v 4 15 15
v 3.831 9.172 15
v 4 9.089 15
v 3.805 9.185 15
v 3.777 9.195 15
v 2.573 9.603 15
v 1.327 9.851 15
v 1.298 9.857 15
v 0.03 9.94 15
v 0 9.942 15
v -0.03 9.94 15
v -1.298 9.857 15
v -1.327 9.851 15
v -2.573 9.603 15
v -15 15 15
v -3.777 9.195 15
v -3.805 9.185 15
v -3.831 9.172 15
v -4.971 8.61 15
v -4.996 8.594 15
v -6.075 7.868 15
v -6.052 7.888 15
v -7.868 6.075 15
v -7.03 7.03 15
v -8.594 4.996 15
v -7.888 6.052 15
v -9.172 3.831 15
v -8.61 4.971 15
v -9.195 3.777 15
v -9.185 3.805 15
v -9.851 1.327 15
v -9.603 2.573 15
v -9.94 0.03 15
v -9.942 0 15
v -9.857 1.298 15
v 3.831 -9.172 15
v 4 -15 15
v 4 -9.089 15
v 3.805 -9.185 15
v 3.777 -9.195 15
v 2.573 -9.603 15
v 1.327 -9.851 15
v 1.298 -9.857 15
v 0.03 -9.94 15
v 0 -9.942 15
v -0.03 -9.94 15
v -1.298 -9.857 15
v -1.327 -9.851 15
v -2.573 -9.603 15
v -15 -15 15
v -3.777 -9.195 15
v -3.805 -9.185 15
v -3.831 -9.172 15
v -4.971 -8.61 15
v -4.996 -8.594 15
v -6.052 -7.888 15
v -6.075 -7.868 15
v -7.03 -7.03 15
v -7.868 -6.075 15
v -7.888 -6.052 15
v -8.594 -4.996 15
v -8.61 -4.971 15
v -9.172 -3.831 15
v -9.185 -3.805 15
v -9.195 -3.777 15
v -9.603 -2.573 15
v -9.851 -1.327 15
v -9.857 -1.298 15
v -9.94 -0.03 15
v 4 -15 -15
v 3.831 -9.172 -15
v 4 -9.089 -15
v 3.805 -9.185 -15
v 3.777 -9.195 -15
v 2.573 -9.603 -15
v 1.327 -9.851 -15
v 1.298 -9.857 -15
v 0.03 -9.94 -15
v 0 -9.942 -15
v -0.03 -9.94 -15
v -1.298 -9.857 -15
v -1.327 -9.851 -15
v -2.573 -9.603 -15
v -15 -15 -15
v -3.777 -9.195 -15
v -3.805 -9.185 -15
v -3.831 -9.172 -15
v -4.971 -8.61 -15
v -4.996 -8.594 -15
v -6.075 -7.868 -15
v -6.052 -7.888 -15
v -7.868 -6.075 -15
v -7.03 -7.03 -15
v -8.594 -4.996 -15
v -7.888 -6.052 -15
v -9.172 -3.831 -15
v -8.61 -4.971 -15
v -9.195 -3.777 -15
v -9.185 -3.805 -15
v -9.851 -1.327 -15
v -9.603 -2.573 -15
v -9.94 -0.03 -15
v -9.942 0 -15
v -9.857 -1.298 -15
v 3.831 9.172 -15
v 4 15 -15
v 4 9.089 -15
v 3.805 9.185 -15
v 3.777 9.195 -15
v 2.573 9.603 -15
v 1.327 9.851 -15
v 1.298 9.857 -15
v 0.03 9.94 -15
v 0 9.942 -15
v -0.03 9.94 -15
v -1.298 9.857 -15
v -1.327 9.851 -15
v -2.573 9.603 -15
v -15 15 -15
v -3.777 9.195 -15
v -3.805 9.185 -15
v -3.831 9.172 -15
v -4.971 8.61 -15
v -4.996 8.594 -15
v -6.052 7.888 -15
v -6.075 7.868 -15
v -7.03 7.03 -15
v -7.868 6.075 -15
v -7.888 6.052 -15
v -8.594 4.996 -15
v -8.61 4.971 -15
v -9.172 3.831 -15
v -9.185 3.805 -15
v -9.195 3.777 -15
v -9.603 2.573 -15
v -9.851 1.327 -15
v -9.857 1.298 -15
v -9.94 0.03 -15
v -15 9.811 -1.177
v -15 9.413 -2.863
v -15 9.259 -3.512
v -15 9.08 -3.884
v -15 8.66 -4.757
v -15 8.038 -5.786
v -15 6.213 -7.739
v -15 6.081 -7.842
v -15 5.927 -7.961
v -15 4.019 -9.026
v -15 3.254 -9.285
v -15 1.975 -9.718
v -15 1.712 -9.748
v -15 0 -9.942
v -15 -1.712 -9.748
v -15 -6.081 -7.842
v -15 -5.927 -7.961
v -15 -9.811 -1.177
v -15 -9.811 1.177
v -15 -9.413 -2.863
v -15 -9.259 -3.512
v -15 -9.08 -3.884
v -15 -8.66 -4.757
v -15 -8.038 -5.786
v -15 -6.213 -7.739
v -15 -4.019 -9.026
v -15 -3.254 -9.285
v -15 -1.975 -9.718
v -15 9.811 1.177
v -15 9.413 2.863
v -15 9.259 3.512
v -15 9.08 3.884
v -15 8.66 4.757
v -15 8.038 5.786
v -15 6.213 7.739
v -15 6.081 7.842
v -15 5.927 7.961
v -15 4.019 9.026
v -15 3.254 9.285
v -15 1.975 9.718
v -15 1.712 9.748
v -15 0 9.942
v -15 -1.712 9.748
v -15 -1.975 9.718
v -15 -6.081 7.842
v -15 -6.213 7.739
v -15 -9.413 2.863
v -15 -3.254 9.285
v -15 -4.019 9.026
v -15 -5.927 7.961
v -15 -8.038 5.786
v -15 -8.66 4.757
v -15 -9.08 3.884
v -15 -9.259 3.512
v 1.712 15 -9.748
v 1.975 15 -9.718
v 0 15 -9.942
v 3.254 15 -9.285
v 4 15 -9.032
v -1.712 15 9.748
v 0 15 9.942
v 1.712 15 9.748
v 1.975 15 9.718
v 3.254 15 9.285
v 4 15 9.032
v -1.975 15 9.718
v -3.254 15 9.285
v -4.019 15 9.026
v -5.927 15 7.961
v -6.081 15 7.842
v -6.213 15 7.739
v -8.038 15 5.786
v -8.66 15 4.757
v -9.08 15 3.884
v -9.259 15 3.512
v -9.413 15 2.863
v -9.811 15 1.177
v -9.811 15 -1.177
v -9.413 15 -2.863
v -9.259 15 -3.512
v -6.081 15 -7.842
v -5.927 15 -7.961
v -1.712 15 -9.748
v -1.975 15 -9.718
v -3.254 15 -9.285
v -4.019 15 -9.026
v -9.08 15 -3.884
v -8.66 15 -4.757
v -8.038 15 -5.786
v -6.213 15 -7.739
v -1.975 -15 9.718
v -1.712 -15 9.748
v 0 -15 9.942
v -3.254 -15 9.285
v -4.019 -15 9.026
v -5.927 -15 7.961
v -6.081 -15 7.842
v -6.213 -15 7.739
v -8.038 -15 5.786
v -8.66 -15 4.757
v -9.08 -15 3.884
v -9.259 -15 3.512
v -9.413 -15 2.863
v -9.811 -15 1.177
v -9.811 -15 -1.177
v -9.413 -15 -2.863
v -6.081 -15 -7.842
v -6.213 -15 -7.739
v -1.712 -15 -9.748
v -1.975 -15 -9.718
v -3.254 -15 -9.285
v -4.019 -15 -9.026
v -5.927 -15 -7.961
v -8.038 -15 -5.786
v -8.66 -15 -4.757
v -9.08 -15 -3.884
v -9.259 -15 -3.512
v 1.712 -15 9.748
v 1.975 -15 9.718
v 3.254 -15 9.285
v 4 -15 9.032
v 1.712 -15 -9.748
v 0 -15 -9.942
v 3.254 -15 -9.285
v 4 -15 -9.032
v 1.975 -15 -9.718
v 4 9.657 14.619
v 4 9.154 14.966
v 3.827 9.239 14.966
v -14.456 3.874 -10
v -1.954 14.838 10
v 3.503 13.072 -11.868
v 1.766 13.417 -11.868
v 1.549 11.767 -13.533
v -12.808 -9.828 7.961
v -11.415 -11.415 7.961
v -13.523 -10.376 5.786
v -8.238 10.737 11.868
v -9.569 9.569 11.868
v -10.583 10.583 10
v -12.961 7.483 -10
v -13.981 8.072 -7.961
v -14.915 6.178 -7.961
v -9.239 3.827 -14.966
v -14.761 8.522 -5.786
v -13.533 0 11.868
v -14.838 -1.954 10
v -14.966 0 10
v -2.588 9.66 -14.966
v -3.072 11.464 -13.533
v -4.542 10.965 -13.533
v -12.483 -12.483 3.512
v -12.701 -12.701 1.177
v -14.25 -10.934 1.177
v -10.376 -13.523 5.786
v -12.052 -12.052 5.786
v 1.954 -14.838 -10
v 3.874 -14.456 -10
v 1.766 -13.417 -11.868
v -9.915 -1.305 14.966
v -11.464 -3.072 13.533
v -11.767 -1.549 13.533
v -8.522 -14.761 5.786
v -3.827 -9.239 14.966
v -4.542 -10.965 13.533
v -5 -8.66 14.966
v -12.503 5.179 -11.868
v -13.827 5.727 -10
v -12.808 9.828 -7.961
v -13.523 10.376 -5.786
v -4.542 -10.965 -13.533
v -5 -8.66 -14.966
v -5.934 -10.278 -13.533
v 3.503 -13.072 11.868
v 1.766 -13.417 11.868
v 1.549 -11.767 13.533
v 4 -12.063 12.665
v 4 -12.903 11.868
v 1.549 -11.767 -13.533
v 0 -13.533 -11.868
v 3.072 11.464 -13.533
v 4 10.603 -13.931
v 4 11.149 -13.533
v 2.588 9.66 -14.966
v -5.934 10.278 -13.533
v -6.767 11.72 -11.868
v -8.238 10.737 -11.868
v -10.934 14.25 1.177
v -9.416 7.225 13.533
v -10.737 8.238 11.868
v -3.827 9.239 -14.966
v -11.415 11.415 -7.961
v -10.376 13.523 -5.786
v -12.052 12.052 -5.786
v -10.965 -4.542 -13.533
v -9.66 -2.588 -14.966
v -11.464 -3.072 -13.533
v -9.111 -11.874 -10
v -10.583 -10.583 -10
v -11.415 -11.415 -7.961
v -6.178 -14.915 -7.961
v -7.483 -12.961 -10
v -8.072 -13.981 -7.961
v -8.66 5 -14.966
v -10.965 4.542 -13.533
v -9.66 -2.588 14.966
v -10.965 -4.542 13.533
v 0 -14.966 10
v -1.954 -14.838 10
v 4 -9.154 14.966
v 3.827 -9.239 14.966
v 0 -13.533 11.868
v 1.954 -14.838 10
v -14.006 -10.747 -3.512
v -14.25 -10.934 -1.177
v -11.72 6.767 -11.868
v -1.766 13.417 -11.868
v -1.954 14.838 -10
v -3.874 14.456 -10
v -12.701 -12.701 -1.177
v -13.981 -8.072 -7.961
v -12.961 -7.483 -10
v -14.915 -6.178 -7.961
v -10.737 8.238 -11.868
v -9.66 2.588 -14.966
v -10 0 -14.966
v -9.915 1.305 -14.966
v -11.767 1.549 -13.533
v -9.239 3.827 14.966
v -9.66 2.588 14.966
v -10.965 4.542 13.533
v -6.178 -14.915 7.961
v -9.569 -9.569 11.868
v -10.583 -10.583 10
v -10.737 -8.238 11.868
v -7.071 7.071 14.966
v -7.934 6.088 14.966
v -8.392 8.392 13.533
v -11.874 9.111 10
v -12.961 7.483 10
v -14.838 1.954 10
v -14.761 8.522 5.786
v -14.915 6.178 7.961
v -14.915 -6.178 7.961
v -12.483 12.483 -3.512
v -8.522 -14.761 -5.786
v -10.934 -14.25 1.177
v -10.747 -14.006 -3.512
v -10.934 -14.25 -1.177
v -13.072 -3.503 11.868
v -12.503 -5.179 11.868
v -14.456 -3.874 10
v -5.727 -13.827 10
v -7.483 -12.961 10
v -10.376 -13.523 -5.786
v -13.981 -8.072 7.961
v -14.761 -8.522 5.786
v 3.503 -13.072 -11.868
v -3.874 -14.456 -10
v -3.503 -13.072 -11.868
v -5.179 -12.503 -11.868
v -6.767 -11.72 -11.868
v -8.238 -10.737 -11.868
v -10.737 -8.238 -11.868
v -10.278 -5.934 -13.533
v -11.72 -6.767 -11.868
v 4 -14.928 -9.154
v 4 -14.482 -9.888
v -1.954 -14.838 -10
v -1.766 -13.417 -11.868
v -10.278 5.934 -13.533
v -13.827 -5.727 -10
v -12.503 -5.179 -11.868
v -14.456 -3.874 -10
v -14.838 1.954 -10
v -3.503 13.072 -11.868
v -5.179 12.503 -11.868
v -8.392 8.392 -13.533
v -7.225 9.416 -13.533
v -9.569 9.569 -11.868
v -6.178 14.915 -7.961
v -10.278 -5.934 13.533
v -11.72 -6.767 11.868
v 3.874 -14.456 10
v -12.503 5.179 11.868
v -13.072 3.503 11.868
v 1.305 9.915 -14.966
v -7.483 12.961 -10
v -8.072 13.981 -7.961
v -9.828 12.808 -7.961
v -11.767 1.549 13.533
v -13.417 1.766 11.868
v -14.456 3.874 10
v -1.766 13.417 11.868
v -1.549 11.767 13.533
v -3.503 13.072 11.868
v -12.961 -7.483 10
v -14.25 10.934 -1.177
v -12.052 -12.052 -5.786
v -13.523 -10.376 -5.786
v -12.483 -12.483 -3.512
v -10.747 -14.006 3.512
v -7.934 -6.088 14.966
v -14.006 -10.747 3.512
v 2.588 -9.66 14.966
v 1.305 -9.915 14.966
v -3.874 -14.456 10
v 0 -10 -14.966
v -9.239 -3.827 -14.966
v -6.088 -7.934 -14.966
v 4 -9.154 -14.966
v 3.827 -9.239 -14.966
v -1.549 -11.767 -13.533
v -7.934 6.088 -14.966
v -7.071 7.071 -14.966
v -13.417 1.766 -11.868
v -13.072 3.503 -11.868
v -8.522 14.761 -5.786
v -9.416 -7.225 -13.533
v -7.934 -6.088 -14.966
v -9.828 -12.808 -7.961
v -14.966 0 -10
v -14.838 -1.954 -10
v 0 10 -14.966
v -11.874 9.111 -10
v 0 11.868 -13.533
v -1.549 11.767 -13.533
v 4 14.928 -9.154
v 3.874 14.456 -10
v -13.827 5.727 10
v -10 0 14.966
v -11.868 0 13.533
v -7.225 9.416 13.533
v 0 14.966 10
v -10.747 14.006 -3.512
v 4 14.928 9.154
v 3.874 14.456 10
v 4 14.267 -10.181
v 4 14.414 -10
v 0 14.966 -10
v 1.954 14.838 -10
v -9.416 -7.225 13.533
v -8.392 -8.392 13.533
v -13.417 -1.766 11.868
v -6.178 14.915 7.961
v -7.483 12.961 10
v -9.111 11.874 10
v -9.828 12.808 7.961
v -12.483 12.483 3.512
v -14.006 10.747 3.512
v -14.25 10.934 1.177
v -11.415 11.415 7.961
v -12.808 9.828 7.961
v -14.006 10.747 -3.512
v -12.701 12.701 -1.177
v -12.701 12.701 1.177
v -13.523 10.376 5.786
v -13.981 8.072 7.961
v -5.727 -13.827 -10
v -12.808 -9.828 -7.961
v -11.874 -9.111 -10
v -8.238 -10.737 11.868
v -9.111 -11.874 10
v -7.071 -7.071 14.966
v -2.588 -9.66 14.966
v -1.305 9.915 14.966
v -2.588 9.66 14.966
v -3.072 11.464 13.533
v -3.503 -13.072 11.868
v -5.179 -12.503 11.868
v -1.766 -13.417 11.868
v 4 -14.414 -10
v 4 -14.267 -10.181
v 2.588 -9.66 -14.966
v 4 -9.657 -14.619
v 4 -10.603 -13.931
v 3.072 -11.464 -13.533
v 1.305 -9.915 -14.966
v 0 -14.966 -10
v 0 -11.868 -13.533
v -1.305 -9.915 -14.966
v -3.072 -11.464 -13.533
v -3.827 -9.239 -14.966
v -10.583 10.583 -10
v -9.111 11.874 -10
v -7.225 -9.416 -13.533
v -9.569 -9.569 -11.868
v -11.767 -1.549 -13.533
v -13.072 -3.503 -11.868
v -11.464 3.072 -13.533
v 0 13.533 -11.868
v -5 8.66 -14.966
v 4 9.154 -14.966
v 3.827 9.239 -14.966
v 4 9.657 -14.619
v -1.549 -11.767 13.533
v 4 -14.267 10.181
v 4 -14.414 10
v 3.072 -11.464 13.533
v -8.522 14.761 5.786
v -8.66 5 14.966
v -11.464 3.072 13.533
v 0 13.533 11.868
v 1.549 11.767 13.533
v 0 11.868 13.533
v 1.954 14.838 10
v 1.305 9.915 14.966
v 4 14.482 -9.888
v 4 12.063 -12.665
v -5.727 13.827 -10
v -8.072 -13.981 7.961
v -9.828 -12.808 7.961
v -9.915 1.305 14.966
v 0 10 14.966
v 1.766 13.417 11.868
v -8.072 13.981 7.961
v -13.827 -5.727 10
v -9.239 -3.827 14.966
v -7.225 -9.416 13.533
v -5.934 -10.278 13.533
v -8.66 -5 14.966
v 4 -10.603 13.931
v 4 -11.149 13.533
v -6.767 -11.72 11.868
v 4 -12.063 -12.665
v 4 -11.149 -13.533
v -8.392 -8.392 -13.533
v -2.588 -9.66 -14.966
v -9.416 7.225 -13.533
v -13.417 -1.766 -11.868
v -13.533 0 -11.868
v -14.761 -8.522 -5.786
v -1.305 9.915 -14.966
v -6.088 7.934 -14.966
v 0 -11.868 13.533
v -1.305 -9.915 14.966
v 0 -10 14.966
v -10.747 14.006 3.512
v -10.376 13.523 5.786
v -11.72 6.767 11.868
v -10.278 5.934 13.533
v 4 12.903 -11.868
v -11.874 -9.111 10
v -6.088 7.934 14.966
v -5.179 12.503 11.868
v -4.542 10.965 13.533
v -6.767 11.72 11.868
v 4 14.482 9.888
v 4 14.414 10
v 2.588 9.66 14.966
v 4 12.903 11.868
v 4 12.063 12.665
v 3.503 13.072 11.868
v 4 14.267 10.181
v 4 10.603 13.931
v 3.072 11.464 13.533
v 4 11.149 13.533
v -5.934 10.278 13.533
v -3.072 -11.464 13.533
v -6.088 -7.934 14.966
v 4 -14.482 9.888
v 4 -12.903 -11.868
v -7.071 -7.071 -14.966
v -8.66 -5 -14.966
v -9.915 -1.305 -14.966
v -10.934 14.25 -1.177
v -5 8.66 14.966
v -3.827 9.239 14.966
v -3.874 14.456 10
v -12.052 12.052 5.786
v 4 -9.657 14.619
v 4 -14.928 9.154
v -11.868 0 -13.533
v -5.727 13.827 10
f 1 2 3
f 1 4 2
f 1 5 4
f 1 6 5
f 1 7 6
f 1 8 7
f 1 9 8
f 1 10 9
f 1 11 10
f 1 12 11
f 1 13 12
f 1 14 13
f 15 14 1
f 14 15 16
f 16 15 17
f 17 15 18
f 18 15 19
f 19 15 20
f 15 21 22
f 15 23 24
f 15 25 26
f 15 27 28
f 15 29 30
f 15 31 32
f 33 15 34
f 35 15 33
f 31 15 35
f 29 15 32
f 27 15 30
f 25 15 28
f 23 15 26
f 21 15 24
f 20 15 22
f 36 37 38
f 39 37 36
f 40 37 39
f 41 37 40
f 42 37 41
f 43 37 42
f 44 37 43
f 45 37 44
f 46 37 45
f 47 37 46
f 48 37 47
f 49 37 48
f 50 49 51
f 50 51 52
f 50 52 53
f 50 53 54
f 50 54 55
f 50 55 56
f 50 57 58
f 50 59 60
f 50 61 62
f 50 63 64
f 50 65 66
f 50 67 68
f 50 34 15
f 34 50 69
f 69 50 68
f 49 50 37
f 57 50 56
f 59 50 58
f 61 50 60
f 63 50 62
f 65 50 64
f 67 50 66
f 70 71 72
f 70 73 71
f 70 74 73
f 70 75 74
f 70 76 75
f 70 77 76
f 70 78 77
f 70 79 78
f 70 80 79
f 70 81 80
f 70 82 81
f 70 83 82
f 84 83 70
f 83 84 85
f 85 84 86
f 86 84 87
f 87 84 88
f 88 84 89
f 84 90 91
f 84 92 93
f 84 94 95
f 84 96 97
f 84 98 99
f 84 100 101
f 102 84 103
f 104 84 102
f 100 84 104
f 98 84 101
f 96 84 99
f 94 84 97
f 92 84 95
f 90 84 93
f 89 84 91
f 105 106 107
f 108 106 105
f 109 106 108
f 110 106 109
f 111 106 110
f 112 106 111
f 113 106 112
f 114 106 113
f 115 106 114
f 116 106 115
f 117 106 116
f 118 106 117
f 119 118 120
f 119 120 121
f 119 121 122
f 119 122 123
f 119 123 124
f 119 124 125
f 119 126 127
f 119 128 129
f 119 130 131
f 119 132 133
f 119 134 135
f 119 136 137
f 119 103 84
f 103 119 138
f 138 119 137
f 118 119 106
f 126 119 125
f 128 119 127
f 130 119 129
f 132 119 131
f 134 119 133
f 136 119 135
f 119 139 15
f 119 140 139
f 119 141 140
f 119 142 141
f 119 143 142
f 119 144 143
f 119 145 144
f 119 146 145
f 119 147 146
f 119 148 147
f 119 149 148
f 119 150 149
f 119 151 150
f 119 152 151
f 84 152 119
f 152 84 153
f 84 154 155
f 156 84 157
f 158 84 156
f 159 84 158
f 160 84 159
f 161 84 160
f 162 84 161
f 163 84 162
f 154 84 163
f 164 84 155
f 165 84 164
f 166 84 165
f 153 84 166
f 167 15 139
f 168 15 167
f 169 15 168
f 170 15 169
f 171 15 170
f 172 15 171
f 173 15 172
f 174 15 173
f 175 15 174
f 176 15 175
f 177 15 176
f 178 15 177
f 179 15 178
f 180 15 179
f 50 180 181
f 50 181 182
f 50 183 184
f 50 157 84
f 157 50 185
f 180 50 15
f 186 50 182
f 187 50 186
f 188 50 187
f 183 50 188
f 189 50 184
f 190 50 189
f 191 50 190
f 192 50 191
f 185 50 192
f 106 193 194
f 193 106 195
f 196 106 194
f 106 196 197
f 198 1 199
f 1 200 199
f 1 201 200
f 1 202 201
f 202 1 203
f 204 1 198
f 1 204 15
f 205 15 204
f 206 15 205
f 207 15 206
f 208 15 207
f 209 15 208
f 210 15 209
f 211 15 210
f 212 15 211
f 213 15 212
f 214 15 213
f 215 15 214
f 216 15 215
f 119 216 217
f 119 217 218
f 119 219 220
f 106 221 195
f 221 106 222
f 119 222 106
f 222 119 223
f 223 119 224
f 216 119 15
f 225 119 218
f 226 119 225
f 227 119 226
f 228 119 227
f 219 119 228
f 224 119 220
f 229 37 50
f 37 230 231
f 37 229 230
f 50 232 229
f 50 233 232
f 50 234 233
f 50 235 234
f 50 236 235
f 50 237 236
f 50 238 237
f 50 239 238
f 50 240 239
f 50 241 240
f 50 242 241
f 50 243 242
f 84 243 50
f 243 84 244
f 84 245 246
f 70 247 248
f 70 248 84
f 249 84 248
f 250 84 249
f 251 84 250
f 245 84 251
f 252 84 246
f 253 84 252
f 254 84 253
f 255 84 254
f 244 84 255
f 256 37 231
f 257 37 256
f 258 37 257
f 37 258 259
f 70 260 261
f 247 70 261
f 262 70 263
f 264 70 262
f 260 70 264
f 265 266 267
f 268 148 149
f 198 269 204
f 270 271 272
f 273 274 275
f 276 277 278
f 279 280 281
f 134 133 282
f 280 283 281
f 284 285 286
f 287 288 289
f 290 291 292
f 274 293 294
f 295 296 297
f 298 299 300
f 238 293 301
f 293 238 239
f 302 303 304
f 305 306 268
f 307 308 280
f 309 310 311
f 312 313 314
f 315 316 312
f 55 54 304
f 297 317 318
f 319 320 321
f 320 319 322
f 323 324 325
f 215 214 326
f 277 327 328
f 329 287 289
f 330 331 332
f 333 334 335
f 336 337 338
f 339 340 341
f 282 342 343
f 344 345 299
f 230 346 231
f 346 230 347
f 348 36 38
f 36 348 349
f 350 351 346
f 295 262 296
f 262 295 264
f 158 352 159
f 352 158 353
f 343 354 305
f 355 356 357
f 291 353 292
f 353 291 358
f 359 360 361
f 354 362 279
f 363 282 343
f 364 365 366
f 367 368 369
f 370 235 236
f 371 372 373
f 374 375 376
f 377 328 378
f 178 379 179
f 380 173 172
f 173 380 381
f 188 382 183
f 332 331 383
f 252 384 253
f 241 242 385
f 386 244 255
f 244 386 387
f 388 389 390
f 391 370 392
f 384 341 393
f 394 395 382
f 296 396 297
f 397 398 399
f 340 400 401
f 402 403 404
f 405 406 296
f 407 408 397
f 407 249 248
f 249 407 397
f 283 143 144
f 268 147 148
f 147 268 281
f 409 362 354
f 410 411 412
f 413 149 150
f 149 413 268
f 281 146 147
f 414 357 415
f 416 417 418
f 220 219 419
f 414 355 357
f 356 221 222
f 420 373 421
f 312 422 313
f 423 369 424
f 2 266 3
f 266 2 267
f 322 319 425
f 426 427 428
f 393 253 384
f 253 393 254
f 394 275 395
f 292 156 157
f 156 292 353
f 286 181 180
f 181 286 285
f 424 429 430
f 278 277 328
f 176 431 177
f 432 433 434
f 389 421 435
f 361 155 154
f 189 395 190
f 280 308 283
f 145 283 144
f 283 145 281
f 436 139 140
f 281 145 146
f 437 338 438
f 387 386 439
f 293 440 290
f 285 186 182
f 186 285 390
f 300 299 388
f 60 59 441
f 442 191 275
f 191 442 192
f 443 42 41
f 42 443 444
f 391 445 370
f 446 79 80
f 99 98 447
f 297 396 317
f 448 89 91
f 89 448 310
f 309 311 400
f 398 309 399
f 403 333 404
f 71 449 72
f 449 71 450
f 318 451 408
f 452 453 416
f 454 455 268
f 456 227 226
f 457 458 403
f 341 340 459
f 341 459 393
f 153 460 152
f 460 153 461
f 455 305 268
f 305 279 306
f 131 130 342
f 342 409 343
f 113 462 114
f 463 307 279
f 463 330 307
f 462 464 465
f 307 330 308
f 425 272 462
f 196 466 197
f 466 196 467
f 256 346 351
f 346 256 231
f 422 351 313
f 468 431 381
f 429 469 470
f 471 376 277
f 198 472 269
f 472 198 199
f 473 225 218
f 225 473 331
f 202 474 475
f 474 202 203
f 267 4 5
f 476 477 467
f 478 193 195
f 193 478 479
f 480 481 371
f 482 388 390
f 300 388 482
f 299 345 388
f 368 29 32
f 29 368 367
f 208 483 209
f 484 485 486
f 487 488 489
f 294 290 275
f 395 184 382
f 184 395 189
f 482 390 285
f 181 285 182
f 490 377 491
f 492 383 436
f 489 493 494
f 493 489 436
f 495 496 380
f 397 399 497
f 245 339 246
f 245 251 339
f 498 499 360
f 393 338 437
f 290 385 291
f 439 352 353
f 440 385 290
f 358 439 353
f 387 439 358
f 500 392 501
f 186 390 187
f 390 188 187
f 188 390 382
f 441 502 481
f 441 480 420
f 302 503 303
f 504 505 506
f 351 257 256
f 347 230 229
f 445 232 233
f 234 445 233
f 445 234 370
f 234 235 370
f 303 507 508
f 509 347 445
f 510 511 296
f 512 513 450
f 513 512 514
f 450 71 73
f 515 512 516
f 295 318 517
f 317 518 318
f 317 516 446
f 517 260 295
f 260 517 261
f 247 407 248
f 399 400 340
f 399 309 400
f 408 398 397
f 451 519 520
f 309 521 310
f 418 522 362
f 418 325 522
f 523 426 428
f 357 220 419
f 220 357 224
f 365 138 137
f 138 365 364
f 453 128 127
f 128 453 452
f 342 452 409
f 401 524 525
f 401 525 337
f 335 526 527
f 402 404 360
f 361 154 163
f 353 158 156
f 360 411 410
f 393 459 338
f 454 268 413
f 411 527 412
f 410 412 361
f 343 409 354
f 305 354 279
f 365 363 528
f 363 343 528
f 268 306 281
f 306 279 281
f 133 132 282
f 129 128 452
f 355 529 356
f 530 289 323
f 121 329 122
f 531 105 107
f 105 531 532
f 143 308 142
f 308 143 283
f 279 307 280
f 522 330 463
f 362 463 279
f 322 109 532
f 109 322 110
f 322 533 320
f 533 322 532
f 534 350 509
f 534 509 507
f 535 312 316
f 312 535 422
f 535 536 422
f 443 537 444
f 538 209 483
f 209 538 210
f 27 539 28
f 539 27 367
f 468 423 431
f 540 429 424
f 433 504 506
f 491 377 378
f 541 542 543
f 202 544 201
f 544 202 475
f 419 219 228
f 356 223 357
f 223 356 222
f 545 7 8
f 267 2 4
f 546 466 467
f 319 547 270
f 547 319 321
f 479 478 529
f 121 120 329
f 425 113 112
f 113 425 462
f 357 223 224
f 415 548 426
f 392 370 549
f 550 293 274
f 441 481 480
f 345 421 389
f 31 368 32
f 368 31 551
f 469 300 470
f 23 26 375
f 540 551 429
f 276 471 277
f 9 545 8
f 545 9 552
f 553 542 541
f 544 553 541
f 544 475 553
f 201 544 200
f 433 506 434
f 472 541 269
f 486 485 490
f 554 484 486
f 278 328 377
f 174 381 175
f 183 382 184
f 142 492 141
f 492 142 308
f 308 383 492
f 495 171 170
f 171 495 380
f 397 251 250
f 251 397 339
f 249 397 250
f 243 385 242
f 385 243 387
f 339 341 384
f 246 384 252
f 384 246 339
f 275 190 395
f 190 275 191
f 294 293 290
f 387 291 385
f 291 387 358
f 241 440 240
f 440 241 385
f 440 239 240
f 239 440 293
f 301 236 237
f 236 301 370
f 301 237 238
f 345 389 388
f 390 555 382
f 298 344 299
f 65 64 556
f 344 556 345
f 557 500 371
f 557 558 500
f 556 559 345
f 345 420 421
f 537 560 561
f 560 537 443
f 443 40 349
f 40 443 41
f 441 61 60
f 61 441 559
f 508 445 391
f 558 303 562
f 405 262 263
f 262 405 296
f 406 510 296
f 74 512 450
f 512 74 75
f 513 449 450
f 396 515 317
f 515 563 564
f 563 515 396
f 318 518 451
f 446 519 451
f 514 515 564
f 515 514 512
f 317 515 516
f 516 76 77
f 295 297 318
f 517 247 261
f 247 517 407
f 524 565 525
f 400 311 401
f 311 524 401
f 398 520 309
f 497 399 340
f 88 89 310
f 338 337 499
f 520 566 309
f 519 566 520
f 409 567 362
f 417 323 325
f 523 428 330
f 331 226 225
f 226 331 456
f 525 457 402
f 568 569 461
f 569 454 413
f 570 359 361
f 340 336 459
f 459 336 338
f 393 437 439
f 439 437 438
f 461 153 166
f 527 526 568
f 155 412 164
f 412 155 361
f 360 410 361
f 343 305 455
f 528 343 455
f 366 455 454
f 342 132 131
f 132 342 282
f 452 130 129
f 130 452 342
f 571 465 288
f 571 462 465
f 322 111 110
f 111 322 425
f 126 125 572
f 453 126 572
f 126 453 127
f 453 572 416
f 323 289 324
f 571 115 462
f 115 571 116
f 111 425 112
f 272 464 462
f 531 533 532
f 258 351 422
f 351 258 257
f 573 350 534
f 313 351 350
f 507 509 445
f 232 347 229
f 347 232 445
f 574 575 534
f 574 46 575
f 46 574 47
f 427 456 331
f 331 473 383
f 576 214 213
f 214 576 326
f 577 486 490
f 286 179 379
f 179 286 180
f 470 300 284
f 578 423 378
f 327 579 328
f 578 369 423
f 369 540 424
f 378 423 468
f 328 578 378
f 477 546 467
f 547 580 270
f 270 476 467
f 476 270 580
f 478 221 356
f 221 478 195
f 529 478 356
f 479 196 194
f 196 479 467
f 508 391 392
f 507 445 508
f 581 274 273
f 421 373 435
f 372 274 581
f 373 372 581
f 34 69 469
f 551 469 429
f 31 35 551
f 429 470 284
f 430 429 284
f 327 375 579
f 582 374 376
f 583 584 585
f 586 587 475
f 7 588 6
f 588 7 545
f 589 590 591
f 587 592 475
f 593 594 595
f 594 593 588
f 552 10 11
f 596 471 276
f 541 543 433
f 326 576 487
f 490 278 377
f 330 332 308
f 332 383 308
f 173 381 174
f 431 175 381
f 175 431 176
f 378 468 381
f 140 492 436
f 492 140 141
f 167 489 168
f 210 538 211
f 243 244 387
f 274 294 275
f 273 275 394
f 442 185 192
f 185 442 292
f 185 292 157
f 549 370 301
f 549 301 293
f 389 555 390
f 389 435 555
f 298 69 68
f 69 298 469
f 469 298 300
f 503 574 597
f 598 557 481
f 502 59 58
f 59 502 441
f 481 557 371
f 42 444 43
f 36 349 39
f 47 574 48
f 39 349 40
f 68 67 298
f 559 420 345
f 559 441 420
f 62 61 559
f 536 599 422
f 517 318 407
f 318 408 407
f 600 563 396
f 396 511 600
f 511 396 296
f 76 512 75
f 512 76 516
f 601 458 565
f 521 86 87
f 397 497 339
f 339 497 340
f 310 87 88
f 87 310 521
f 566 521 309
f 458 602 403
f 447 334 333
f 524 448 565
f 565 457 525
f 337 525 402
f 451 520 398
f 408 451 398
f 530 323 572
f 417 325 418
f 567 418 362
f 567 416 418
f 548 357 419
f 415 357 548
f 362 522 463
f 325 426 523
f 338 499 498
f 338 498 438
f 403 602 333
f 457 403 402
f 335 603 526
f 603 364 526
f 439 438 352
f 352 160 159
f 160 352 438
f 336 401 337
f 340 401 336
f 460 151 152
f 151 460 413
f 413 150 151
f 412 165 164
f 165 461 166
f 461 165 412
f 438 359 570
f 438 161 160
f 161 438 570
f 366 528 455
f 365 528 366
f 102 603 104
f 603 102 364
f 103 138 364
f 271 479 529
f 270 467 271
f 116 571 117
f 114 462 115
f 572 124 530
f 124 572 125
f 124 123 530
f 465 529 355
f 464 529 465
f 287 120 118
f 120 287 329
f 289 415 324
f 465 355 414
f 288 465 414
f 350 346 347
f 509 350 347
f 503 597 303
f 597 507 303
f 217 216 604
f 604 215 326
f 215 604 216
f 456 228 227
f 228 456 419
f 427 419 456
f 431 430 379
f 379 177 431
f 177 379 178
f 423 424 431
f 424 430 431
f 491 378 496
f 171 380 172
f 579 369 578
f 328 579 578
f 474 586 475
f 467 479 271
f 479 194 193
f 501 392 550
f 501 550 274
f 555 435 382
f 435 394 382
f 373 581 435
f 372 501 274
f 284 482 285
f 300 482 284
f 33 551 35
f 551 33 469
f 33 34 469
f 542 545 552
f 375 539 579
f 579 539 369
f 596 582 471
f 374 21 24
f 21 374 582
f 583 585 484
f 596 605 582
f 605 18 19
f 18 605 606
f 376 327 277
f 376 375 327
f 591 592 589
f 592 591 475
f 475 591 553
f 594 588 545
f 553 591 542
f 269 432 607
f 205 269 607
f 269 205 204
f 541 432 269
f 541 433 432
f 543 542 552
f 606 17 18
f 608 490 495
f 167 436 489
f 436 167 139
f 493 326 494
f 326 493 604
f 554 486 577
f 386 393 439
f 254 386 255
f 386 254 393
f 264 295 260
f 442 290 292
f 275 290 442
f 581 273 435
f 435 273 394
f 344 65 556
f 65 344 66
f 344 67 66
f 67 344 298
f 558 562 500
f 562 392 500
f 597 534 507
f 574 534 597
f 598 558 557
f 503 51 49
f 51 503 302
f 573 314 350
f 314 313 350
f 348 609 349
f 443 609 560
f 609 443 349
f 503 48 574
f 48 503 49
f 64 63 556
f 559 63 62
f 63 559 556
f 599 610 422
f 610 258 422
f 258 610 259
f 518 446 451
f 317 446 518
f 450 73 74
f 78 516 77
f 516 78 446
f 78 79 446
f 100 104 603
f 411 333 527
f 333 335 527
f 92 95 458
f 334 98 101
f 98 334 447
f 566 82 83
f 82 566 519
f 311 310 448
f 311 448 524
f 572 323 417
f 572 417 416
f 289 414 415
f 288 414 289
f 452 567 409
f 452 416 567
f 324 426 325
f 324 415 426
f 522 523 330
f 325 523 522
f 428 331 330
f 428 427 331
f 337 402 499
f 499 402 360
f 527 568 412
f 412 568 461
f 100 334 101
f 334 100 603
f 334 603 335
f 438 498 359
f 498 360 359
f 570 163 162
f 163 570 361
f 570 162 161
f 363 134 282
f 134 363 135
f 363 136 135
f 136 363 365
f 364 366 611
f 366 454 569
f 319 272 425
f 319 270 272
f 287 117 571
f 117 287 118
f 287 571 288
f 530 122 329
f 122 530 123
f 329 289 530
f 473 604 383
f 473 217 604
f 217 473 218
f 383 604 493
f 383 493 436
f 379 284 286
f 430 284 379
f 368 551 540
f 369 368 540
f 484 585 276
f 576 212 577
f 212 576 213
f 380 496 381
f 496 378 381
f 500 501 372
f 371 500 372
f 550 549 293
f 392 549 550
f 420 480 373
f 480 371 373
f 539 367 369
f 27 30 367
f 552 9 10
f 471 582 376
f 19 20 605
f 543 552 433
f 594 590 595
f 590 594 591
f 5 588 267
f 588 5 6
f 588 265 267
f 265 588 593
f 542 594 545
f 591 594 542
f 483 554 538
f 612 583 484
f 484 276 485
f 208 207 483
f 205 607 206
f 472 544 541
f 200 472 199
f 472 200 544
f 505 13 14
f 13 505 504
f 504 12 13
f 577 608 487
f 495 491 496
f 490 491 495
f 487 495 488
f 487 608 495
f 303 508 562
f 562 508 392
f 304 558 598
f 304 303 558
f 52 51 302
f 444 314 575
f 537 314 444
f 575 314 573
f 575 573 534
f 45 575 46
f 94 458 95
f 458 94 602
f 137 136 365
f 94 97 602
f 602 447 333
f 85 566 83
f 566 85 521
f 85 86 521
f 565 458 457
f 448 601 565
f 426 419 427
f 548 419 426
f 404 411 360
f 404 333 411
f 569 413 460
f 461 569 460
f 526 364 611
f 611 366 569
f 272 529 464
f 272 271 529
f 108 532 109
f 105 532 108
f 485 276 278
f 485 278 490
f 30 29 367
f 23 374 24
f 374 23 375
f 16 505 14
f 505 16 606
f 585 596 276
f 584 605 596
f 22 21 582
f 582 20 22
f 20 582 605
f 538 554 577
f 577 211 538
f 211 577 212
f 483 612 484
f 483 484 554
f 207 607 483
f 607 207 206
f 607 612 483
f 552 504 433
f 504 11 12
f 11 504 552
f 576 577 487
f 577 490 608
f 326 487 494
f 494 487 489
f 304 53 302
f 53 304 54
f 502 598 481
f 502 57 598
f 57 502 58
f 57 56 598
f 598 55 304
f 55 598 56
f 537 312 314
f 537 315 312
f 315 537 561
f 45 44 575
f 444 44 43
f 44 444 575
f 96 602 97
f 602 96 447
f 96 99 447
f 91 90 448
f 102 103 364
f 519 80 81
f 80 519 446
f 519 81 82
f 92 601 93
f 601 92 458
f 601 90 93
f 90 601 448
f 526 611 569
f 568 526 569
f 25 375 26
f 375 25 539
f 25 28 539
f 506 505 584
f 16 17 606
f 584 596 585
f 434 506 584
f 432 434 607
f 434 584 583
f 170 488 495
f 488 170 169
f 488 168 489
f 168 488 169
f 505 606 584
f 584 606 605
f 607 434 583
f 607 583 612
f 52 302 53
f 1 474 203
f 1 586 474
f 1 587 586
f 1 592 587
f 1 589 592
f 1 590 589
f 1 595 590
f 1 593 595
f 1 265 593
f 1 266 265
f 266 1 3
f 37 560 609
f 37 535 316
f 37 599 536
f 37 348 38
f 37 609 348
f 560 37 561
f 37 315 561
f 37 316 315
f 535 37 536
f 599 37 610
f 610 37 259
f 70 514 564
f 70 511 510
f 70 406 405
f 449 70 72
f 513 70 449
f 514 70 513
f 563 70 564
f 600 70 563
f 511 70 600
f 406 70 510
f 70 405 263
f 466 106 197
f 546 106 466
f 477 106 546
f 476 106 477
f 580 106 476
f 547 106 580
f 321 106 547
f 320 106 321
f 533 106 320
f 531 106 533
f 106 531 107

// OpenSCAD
// ============================================================
//  cut_plane_viewer — interactive cut-plane viewer for the OpenSCAD GUI.
//
//  cut_plane_view(axis, pos, show) wraps a part and shows a section plane at
//  axis = pos four ways, so you sweep CUT_POS in the Customizer and read where
//  / how the plane cuts:
//    "off"   — just the part, no plane (the clean default view: this is why it can
//              live at the end of a main.scad without changing its default render).
//    "plane" — part + a translucent red plane at pos (WHERE it cuts).
//    "cut"   — part clipped at the plane (half-space): the cross-section in 3D,
//              in place (a cutaway view).
//    "slice" — the TRUE 2D cross-section, extruded thin and placed back ON the
//              cut plane (in situ): the clean outline, where it actually cuts.
//
//  Self-contained (no `use`/`include`): the 2D section uses the slice.scad
//  projection convention INLINE (z: img=XY · x: img=Y,Z · y: img=X,Z; det +1,
//  no mirror). So tools/make_assembly.py can either `use <cut_plane_viewer.scad>`
//  (in-repo project files) or copy these module defs verbatim into a portable,
//  dependency-free stl_assembly.scad — ONE source either way.
//
//  Inspection-only geometry (never part of a printed piece). It lives in lib/
//  because it is reusable .scad consumed by the main.scad front doors, even
//  though it is not a geometric primitive (see lib/CLAUDE.md). Drive it from a
//  Customizer file; never `include` (it would leak the
//  self-preview). The block between the first `module` and the Self-preview line
//  is what make_assembly inlines, so keep all state in module defaults (no
//  top-level constants there).
// ============================================================
module cut_plane_view(axis = "x", pos = 0, show = "off", plane_size = 300) {
    if (show == "off") children();
    else if (show == "cut") intersection() { children(); _cpv_half(axis, pos); }
    else if (show == "slice") _cpv_slice(axis, pos) children();
    else { children(); color([0.85, 0.10, 0.10, 0.33]) _cpv_plane(axis, pos, plane_size); }
}
module _cpv_plane(axis, pos, s = 300, th = 0.6) {
    if (axis == "x")      translate([pos, 0, 0]) cube([th, s, s], center = true);
    else if (axis == "y") translate([0, pos, 0]) cube([s, th, s], center = true);
    else                  translate([0, 0, pos]) cube([s, s, th], center = true);
}
module _cpv_half(axis, pos, b = 1000) {
    if (axis == "x")      translate([pos - b, -b/2, -b/2]) cube(b);
    else if (axis == "y") translate([-b/2, pos - b, -b/2]) cube(b);
    else                  translate([-b/2, -b/2, pos - b]) cube(b);
}
module _cpv_section(axis, pos) {
    if (axis == "z") projection(cut = true) translate([0, 0, -pos]) children();
    else if (axis == "x") projection(cut = true)
        multmatrix([[0,1,0,0],[0,0,1,0],[1,0,0,-pos],[0,0,0,1]]) children();
    else projection(cut = true)
        multmatrix([[1,0,0,0],[0,0,1,0],[0,-1,0,pos],[0,0,0,1]]) children();
}
module _cpv_slice(axis, pos, th = 0.6) {
    if (axis == "z") translate([0,0,pos])
        linear_extrude(th, center=true) _cpv_section("z", pos) children();
    else if (axis == "x") translate([pos,0,0]) rotate([90,0,90])
        linear_extrude(th, center=true) _cpv_section("x", pos) children();
    else translate([0,pos,0]) rotate([90,0,0])
        linear_extrude(th, center=true) _cpv_section("y", pos) children();
}

// ---------- Self-preview (top-level; `use <...>` ignores it — never `include`) ----------
$fn = 48;
cut_plane_view("x", 4, "cut") difference() { cube(30, center = true); sphere(18); }
